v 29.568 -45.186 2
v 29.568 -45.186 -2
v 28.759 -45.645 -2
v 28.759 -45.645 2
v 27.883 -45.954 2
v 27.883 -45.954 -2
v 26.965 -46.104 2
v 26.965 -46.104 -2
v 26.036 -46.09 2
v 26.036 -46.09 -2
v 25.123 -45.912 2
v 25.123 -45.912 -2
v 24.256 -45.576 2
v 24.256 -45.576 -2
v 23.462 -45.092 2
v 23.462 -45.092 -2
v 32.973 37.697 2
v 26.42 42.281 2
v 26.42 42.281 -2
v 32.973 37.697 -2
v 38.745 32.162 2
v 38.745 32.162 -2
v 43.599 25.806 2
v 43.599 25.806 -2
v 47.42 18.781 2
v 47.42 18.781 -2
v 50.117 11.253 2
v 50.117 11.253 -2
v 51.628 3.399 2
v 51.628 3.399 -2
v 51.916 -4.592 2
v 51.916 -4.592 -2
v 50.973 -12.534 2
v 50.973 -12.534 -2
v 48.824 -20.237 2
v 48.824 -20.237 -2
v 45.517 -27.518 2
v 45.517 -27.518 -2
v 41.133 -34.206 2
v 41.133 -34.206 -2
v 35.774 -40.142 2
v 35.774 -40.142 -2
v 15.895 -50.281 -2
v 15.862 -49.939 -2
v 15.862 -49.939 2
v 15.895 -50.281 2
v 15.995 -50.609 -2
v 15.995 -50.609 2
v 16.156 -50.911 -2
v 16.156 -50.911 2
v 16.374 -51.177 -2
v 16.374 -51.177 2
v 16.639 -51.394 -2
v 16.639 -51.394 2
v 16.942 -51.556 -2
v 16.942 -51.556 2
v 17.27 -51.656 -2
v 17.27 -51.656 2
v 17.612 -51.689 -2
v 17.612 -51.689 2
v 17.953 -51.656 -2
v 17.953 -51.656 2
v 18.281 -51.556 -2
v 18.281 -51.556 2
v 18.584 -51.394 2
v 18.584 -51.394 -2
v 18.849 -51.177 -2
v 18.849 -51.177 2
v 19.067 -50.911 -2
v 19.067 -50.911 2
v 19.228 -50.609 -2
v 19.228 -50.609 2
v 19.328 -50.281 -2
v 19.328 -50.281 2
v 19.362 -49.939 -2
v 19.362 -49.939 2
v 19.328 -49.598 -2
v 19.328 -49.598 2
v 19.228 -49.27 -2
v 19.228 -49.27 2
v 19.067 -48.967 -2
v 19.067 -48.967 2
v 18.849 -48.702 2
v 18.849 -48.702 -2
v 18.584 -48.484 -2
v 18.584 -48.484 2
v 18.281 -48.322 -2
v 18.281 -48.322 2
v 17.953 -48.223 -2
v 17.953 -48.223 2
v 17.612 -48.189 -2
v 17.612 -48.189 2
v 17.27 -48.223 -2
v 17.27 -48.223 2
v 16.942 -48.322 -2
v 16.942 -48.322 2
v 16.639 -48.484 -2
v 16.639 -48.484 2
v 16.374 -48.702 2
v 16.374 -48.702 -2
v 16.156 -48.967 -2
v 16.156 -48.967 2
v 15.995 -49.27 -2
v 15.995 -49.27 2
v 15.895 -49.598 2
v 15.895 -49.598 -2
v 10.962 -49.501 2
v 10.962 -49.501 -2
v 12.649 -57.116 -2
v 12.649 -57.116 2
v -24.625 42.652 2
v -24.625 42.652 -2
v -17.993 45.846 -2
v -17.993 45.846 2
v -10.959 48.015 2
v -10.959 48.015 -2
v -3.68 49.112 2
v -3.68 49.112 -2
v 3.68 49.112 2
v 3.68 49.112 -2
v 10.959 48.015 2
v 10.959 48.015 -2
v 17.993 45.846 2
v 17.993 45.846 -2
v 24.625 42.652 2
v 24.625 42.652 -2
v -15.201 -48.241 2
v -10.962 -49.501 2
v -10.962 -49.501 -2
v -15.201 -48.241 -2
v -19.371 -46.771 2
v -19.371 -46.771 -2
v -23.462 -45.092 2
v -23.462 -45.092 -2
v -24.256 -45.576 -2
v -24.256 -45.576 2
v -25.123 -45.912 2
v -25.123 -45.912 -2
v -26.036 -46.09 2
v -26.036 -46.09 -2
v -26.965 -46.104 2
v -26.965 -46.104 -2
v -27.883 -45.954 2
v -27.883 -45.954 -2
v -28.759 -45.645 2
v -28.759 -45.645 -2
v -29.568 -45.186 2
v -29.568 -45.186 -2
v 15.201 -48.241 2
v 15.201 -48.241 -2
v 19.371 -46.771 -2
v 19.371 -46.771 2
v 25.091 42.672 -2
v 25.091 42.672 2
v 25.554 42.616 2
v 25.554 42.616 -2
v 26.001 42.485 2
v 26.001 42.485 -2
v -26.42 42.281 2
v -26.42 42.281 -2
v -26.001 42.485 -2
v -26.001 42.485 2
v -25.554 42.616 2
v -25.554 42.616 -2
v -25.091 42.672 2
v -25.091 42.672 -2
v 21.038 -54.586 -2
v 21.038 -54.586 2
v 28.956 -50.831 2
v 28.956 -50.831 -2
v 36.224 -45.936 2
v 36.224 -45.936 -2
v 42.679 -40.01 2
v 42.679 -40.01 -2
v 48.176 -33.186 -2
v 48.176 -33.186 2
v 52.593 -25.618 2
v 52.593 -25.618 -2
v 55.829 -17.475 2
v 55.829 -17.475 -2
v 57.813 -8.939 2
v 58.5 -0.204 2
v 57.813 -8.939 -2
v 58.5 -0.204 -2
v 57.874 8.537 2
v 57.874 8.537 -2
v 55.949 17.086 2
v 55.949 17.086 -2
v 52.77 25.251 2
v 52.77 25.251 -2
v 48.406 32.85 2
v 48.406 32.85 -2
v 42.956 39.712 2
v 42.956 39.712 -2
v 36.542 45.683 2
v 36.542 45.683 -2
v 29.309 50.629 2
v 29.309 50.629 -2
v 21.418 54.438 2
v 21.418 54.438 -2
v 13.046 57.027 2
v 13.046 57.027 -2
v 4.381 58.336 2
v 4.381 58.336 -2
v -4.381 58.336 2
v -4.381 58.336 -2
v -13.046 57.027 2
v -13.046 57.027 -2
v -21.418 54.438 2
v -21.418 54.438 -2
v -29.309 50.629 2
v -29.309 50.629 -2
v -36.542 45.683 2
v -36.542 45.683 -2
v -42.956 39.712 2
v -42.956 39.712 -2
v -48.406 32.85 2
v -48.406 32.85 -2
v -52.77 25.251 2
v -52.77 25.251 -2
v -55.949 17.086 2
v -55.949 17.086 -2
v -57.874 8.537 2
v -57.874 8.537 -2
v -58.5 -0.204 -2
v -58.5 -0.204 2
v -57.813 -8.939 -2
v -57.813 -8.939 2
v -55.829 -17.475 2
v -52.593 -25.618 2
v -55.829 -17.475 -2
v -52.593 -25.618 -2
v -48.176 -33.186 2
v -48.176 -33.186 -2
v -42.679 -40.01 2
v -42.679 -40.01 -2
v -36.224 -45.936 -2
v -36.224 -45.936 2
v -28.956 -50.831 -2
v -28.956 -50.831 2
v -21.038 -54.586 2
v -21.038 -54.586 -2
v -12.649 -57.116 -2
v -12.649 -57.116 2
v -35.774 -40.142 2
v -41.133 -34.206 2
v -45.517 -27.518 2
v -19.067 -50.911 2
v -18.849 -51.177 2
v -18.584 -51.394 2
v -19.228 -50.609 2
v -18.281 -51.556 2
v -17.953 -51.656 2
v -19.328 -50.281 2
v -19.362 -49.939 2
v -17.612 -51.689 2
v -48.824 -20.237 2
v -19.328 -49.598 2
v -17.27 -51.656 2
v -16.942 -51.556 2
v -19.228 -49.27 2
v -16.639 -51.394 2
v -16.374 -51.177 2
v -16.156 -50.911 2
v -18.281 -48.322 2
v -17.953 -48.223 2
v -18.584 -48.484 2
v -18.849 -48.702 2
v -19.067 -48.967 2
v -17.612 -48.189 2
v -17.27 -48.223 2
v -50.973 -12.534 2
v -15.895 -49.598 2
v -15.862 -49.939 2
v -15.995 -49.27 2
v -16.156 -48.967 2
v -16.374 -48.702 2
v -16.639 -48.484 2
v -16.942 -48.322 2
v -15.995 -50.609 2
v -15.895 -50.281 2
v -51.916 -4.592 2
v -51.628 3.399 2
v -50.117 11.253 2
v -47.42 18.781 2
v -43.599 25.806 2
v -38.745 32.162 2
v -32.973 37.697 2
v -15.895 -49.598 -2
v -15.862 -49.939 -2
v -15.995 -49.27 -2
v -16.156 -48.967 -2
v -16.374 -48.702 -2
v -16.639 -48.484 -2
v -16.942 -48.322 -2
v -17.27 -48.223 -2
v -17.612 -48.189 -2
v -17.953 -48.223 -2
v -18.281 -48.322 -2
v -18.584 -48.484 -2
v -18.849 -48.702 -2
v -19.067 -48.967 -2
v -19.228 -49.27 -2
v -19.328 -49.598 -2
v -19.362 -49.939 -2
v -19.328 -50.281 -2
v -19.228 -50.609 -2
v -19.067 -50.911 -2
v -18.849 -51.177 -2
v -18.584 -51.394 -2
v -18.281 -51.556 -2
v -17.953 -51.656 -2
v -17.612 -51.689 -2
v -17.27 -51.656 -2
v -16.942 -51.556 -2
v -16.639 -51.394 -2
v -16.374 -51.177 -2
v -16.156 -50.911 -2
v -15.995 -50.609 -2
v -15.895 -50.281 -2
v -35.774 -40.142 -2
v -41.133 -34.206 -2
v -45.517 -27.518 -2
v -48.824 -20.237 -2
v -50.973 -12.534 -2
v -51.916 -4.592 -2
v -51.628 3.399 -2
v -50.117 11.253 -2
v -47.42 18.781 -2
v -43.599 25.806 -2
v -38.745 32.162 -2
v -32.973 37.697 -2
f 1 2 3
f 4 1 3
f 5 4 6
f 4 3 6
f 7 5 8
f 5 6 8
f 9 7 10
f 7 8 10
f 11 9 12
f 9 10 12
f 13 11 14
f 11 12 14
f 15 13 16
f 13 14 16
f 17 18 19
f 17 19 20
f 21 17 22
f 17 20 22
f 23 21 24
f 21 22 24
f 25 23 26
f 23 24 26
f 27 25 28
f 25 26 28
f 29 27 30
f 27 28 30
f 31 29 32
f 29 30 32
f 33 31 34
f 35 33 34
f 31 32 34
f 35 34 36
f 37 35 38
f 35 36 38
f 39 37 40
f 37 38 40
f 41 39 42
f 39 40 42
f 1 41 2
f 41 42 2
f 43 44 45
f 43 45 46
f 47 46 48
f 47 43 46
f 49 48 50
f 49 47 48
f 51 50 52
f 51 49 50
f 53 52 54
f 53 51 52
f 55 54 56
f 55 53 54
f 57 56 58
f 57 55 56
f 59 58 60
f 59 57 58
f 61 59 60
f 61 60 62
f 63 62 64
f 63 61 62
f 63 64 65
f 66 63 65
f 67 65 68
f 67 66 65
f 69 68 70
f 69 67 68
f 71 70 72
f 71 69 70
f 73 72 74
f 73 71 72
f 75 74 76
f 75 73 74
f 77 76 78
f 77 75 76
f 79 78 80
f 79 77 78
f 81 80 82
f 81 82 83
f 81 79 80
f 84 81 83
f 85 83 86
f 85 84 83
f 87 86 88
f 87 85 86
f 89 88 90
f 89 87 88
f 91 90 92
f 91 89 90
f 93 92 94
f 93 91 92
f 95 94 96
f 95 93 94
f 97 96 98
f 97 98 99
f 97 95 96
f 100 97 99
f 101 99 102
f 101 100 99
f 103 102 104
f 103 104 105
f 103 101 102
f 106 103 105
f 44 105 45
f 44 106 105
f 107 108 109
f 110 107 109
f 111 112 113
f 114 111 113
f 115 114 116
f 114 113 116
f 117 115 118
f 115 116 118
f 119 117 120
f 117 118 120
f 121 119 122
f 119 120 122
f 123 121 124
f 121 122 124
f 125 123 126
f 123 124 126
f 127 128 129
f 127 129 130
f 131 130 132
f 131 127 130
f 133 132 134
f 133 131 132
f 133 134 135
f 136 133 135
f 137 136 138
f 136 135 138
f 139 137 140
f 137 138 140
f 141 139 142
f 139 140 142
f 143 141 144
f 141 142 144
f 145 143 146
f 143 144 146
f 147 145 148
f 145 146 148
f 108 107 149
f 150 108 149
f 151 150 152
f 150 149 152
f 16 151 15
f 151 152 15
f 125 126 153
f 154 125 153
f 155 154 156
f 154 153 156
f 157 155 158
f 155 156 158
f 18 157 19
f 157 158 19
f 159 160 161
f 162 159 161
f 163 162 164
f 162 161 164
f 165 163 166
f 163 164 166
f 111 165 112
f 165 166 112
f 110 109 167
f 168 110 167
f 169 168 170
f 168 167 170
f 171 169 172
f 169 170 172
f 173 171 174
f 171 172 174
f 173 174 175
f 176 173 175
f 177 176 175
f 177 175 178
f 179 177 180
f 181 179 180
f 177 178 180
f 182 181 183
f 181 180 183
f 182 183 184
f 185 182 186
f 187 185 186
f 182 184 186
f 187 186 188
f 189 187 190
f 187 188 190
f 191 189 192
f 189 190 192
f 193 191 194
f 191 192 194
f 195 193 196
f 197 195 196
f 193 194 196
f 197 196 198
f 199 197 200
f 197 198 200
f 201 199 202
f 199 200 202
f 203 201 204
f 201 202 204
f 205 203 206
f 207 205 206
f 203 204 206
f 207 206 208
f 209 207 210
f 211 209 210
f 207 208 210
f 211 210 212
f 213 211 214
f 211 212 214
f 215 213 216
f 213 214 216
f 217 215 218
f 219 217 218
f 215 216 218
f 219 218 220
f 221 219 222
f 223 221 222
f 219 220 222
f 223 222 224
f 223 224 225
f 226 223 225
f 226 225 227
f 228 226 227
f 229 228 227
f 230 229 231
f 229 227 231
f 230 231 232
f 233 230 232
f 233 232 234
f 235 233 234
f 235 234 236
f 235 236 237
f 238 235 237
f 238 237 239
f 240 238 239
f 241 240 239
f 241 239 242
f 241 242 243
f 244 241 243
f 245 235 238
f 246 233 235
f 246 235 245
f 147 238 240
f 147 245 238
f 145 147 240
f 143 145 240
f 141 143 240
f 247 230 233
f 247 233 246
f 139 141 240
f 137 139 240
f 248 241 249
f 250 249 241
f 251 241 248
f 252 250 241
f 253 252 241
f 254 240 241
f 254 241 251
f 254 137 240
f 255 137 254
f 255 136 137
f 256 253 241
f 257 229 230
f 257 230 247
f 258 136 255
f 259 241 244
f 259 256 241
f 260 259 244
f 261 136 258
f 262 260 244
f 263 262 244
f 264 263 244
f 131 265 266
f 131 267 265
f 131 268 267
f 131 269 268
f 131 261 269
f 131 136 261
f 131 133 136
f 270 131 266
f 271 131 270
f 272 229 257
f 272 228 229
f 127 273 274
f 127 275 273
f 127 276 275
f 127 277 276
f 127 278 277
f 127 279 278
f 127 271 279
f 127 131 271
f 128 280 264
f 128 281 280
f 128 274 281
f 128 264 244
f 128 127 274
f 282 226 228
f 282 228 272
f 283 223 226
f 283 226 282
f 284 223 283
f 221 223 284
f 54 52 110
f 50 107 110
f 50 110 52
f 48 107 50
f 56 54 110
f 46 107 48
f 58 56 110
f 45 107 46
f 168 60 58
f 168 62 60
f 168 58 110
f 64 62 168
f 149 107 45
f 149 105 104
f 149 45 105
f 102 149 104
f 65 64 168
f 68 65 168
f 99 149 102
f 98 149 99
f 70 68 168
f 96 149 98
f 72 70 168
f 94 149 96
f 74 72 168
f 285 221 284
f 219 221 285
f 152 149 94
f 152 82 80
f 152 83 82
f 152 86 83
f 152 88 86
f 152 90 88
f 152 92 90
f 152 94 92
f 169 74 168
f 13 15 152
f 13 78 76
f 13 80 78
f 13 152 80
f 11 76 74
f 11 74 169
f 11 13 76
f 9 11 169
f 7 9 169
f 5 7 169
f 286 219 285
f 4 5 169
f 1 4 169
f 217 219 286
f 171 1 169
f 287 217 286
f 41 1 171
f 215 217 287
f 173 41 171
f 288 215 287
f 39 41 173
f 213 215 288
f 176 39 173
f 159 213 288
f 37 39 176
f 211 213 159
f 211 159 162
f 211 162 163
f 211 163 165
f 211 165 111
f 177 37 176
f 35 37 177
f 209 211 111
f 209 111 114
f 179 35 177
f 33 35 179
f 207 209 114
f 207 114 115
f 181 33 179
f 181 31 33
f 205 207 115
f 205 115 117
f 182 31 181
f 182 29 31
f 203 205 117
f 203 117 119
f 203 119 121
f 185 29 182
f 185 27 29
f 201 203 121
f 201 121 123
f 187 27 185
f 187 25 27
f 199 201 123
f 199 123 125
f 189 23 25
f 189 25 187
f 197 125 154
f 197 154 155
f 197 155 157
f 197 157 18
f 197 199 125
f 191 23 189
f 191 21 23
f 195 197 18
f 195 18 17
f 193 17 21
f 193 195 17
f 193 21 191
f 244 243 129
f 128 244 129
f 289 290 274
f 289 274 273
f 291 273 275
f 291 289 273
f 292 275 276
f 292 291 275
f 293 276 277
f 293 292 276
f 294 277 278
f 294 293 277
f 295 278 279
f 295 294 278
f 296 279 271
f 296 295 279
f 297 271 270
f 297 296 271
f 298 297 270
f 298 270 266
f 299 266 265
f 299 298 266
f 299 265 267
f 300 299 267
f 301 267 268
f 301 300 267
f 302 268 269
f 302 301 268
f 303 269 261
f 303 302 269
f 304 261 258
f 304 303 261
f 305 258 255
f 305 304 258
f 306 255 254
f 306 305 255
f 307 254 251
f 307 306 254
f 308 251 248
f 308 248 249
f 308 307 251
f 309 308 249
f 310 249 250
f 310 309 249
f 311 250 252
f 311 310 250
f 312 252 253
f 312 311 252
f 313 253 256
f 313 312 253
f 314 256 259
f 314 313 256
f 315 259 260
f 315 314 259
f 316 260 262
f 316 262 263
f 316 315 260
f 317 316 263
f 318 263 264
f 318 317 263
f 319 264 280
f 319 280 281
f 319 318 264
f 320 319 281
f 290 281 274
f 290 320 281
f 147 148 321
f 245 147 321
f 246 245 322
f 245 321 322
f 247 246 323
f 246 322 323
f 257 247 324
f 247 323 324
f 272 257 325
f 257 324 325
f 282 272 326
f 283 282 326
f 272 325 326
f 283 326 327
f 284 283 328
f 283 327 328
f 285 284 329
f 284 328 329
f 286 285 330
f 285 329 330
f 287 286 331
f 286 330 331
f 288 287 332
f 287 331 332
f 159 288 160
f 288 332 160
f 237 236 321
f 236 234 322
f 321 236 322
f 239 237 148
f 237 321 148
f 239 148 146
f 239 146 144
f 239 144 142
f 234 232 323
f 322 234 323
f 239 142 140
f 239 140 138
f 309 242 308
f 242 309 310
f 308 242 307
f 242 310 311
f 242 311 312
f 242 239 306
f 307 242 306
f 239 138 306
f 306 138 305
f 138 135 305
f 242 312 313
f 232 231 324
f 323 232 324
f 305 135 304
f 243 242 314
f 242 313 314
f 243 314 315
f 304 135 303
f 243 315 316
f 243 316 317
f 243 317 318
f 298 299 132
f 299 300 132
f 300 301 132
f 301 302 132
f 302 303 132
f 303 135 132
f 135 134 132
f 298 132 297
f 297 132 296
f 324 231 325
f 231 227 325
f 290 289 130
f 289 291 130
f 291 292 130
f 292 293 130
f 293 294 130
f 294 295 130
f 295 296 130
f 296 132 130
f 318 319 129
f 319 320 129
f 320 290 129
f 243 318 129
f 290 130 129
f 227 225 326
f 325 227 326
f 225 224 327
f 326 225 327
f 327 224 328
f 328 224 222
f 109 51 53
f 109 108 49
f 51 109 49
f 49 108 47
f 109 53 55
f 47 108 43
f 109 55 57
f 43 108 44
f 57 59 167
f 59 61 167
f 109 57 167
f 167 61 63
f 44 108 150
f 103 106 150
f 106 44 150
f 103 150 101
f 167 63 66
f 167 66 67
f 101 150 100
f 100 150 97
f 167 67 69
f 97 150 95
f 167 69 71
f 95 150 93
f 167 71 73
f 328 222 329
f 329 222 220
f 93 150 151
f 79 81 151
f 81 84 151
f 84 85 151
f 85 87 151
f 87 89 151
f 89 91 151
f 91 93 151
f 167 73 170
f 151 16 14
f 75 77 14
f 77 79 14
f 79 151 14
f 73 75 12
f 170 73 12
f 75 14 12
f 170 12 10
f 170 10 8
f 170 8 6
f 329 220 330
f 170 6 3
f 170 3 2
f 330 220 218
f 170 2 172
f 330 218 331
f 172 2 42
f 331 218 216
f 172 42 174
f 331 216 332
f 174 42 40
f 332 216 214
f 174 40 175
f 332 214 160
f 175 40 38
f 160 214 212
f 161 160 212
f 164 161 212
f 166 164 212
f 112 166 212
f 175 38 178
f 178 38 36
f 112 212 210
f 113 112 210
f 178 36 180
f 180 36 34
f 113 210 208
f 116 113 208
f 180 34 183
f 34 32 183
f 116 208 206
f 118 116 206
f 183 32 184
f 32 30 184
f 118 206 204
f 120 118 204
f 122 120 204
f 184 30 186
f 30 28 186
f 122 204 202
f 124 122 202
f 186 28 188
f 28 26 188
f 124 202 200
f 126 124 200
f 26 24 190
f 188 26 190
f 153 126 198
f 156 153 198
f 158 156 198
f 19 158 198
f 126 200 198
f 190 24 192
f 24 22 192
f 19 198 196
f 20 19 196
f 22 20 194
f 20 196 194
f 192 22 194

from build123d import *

# Parameters (mm, degrees)
BOSS_EXTRUDE1_DEPTH      = 2
BOSS_EXTRUDE1_DEPTH_BACK = 2
SKETCH3_R                = 1.75
BOSS_EXTRUDE2_START      = -2
BOSS_EXTRUDE2_DEPTH      = 4
CUT_EXTRUDE2_DEPTH       = 83.755664459


with BuildPart() as part:
    # Sketch3 → Boss-Extrude1 (new, two sides: drawn at the far end of the back side and taken through both)
    with BuildSketch(Plane.XY.offset(-BOSS_EXTRUDE1_DEPTH_BACK)):
        with BuildLine():
            Line((-12.648648649, -57.116212124), (-10.962162162, -49.500717174))
            Line((-10.962162162, -49.500717174), (-23.462338081, -45.092415448))
            ThreePointArc((-23.462338081, -45.092415448), (-26.50014347, -46.117965154), (-29.56784511, -45.185645238))
            ThreePointArc((-29.56784511, -45.185645238), (0, 49.5), (29.56784511, -45.185645238))
            ThreePointArc((29.56784511, -45.185645238), (26.50014347, -46.117965154), (23.462338081, -45.092415448))
            Line((23.462338081, -45.092415448), (10.962162162, -49.500717174))
            Line((10.962162162, -49.500717174), (12.648648649, -57.116212124))
            ThreePointArc((12.648648649, -57.116212124), (0, 58.5), (-12.648648649, -57.116212124))
        make_face()
        with Locations((-17.611521005, -49.939211163)):
            Circle(SKETCH3_R, mode=Mode.SUBTRACT)
        with Locations(Location((17.611521005, -49.939211163, 0), (0, 0, 180))):
            Circle(SKETCH3_R, mode=Mode.SUBTRACT)
    extrude(amount=BOSS_EXTRUDE1_DEPTH + BOSS_EXTRUDE1_DEPTH_BACK)

    # Sketch6 → Boss-Extrude2 (add)
    with BuildSketch(Plane.XY.offset(BOSS_EXTRUDE2_START)):
        with BuildLine():
            ThreePointArc((-24.625, 42.651751136), (0, 49.25), (24.625, 42.651751136))
            ThreePointArc((24.625, 42.651751136), (25.553522607, 42.616086127), (26.420381097, 42.28144814))
            ThreePointArc((26.420381097, 42.28144814), (0, 49.5), (-26.420381097, 42.28144814))
            ThreePointArc((-26.420381097, 42.28144814), (-25.553522607, 42.616086127), (-24.625, 42.651751136))
        make_face()
    extrude(amount=BOSS_EXTRUDE2_DEPTH)

    # Sketch5 → Cut-Extrude2 (cut, symmetric)
    with BuildSketch(Plane.XY):
        with BuildLine():
            Line((-23.462338081, -45.092415448), (0, 0))
            Line((0, 0), (-10.962162162, -49.500717174))
            ThreePointArc((-10.962162162, -49.500717174), (-17.295396026, -47.532334754), (-23.462338081, -45.092415448))
        make_face()
    cut_extrude2 = extrude(amount=CUT_EXTRUDE2_DEPTH, both=True, mode=Mode.SUBTRACT)

    # Mirror1: Cut-Extrude2 across plane
    add(cut_extrude2.mirror(Plane(origin=(0, 0, 0), x_dir=(0, 0, 1), z_dir=(1, 0, 0))), mode=Mode.SUBTRACT)


solid = part.part
